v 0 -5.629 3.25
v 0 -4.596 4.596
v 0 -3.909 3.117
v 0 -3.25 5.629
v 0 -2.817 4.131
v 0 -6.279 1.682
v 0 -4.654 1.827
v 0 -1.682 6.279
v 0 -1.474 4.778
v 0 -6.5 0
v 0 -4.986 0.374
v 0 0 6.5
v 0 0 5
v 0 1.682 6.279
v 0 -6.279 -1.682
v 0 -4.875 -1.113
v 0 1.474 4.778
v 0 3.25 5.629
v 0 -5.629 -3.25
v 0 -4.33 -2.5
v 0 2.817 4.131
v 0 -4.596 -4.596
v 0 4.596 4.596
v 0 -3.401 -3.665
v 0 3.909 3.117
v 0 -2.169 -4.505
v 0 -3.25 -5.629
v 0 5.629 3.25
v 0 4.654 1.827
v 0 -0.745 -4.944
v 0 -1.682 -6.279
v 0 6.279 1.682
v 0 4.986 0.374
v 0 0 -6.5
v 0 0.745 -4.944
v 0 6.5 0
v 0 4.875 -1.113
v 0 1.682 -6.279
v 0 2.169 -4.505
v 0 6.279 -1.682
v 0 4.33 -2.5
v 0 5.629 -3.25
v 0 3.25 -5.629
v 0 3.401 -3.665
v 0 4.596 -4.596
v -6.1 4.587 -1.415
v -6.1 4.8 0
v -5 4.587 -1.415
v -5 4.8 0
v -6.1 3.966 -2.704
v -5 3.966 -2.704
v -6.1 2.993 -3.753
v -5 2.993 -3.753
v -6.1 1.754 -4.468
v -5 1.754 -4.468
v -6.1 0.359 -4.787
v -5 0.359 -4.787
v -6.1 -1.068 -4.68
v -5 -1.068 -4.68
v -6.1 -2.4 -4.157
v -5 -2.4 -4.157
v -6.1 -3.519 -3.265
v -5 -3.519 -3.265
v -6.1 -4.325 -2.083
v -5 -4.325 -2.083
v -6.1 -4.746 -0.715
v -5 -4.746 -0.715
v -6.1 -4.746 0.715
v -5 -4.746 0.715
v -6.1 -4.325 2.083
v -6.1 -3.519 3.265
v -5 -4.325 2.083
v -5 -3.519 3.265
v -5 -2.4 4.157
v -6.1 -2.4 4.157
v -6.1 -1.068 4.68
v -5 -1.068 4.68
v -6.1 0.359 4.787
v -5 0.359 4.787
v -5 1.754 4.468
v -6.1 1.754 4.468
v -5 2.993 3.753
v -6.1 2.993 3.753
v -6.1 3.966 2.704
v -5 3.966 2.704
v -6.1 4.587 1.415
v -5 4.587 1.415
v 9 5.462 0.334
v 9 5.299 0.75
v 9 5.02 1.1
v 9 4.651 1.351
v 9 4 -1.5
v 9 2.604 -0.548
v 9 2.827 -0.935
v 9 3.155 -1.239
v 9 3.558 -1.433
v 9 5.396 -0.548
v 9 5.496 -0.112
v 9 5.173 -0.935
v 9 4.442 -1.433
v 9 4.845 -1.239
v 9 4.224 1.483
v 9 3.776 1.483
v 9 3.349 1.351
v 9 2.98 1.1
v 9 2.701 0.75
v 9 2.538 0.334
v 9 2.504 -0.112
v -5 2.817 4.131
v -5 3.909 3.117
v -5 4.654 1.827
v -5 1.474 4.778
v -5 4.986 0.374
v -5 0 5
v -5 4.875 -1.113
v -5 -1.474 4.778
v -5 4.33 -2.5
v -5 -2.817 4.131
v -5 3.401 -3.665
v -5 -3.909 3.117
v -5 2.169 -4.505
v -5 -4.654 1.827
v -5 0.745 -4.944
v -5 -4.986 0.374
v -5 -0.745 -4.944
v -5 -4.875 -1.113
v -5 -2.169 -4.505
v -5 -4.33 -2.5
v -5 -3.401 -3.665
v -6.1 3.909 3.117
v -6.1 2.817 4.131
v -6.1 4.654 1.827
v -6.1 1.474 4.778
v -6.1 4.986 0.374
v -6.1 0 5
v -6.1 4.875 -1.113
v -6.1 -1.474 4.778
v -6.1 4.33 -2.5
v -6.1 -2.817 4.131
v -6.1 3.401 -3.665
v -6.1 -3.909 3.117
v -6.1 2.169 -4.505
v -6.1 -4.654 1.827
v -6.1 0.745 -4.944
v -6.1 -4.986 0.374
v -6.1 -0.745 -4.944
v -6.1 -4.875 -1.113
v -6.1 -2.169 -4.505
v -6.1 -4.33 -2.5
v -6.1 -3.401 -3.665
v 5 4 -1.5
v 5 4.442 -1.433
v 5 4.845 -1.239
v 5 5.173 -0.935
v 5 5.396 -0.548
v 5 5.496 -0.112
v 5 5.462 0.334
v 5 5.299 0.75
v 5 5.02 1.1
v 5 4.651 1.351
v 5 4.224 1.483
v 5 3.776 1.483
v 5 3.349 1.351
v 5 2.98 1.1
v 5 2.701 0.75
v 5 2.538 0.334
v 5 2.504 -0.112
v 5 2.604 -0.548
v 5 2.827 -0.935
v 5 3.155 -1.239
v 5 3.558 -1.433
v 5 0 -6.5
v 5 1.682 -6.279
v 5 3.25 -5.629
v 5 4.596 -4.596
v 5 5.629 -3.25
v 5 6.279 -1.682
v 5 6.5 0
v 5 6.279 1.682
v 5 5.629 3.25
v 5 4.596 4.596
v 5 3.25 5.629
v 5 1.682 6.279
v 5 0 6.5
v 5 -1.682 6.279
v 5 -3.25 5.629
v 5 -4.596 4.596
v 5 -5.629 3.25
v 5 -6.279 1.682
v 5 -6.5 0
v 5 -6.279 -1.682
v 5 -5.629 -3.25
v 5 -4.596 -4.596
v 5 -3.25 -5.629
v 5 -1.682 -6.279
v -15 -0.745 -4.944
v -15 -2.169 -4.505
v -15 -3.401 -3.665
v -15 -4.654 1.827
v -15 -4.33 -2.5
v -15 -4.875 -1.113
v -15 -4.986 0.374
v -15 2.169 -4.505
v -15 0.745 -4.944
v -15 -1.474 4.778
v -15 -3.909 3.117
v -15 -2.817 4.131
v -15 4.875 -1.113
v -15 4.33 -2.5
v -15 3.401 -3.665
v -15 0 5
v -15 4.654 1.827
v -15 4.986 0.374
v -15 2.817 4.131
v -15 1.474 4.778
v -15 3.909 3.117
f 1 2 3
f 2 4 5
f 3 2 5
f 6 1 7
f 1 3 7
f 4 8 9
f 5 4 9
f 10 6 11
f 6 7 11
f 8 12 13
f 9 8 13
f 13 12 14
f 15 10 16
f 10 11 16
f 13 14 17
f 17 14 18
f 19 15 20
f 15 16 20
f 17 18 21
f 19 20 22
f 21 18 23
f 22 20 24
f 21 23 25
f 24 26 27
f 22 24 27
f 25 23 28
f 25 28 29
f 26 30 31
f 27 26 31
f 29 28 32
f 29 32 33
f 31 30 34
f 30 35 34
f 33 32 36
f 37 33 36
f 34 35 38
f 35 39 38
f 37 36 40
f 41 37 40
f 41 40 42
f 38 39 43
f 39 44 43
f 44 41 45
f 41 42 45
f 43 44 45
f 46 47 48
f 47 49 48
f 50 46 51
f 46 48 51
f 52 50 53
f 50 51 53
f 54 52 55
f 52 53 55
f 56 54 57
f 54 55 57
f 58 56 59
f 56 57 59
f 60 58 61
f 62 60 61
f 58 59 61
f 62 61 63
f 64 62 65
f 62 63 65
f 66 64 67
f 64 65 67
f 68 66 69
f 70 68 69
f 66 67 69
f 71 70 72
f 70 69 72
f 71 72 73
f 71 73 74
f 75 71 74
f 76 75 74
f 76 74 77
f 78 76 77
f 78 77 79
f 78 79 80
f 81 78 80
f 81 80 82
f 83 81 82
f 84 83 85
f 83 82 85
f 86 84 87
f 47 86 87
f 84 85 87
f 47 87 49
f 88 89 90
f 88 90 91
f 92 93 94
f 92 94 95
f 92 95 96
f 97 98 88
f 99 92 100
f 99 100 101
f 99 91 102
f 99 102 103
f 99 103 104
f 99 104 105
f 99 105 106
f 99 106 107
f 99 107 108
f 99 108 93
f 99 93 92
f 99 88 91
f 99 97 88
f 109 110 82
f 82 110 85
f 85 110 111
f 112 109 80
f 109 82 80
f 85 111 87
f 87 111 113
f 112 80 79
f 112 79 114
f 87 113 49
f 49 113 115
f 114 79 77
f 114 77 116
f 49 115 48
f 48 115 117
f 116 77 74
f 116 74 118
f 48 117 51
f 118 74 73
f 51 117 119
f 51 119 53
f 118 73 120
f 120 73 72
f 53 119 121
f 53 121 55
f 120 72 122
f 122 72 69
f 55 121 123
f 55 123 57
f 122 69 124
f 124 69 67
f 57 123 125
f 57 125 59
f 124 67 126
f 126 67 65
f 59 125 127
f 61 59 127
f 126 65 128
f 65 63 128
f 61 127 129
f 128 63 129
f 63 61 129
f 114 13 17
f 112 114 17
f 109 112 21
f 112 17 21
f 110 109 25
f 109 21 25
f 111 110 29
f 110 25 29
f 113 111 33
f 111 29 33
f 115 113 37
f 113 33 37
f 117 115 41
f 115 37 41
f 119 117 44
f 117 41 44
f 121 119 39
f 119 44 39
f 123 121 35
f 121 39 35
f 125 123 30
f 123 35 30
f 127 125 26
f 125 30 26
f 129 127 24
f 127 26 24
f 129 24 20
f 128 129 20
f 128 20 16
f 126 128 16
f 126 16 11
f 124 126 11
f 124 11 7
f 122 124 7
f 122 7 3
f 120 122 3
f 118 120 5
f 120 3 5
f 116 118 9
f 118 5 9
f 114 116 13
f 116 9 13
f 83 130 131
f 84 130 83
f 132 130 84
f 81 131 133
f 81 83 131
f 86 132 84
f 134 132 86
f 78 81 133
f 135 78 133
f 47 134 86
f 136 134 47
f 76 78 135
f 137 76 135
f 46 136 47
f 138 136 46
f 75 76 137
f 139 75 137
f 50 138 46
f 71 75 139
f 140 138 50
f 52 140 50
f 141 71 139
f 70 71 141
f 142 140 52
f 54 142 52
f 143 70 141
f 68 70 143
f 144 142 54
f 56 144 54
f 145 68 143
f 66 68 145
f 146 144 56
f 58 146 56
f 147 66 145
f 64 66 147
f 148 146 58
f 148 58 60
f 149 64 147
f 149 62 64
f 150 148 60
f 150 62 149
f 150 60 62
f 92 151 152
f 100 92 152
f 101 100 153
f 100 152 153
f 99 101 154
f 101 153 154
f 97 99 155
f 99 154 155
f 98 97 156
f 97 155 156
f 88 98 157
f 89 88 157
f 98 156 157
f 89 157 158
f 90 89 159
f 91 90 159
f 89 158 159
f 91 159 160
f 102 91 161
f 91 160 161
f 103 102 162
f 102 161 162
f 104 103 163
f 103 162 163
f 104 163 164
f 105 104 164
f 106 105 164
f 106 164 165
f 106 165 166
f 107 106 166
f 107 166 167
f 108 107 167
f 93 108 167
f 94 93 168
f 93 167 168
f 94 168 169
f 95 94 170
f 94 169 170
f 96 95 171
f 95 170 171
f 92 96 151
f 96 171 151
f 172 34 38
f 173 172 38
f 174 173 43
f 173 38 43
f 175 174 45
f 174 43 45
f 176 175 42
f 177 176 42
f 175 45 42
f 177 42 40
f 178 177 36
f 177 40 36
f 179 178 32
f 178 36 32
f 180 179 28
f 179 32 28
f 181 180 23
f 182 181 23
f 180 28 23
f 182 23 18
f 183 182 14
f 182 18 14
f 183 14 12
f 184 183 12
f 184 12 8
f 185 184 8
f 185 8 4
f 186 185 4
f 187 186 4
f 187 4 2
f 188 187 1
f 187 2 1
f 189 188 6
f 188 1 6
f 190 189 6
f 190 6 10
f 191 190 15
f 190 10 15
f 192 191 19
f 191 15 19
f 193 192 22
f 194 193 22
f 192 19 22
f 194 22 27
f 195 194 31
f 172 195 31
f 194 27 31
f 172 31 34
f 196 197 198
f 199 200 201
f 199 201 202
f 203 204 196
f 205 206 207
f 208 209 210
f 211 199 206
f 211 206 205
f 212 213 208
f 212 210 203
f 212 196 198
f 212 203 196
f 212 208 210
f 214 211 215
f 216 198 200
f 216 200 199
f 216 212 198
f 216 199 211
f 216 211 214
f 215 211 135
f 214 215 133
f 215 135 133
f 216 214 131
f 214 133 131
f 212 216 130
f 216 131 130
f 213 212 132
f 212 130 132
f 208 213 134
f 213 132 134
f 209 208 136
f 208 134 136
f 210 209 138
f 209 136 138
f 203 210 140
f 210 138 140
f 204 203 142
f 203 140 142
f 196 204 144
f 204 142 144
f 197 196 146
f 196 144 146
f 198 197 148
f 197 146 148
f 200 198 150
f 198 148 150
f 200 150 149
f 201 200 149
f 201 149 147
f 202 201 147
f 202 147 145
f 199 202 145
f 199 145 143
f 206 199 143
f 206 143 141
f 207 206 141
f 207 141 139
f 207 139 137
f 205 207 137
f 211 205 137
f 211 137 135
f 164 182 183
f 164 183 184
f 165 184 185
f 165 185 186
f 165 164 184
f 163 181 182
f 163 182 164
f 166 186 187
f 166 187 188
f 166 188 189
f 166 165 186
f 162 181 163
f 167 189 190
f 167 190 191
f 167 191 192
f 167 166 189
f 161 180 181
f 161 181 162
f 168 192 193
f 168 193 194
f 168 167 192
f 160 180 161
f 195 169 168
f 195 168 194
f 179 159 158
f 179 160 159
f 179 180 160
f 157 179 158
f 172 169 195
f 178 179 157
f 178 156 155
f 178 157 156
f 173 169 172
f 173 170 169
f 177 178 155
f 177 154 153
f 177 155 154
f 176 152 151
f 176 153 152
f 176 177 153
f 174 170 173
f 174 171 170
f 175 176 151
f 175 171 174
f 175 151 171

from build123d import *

# Parameters (mm, degrees)
SKETCH1_R           = 6.5
BOSS_EXTRUDE1_DEPTH = 5
SKETCH2_R           = 5
BOSS_EXTRUDE2_DEPTH = 15
SKETCH3_R           = 1.5
BOSS_EXTRUDE3_DEPTH = 4
SKETCH4_W           = 1.1
SKETCH4_H           = 0.2


with BuildPart() as part:
    # Sketch1 → Boss-Extrude1 (new body)
    with BuildSketch(Plane(origin=(0, 0, 0), x_dir=(0, 0, -1), z_dir=(1, 0, 0))):
        Circle(SKETCH1_R)
    extrude(amount=BOSS_EXTRUDE1_DEPTH)

    # Sketch2 → Boss-Extrude2 (add)
    with BuildSketch(Plane.ZY):
        Circle(SKETCH2_R)
    extrude(amount=BOSS_EXTRUDE2_DEPTH)

    # Sketch3 → Boss-Extrude3 (add)
    with BuildSketch(Plane(origin=(5, 0, 0), x_dir=(0, 0, -1), z_dir=(1, 0, 0))):
        with Locations((0, 4)):
            Circle(SKETCH3_R)
    extrude(amount=BOSS_EXTRUDE3_DEPTH)

    # Sketch4 → Cut-Revolve1 (revolve, cut)
    with BuildSketch(Plane.XY):
        with Locations((-5.55, 4.9)):
            Rectangle(SKETCH4_W, SKETCH4_H)
    revolve(axis=Axis((-1.178470482, 0, 0), (-1, 0, 0)), mode=Mode.SUBTRACT)


solid = part.part
